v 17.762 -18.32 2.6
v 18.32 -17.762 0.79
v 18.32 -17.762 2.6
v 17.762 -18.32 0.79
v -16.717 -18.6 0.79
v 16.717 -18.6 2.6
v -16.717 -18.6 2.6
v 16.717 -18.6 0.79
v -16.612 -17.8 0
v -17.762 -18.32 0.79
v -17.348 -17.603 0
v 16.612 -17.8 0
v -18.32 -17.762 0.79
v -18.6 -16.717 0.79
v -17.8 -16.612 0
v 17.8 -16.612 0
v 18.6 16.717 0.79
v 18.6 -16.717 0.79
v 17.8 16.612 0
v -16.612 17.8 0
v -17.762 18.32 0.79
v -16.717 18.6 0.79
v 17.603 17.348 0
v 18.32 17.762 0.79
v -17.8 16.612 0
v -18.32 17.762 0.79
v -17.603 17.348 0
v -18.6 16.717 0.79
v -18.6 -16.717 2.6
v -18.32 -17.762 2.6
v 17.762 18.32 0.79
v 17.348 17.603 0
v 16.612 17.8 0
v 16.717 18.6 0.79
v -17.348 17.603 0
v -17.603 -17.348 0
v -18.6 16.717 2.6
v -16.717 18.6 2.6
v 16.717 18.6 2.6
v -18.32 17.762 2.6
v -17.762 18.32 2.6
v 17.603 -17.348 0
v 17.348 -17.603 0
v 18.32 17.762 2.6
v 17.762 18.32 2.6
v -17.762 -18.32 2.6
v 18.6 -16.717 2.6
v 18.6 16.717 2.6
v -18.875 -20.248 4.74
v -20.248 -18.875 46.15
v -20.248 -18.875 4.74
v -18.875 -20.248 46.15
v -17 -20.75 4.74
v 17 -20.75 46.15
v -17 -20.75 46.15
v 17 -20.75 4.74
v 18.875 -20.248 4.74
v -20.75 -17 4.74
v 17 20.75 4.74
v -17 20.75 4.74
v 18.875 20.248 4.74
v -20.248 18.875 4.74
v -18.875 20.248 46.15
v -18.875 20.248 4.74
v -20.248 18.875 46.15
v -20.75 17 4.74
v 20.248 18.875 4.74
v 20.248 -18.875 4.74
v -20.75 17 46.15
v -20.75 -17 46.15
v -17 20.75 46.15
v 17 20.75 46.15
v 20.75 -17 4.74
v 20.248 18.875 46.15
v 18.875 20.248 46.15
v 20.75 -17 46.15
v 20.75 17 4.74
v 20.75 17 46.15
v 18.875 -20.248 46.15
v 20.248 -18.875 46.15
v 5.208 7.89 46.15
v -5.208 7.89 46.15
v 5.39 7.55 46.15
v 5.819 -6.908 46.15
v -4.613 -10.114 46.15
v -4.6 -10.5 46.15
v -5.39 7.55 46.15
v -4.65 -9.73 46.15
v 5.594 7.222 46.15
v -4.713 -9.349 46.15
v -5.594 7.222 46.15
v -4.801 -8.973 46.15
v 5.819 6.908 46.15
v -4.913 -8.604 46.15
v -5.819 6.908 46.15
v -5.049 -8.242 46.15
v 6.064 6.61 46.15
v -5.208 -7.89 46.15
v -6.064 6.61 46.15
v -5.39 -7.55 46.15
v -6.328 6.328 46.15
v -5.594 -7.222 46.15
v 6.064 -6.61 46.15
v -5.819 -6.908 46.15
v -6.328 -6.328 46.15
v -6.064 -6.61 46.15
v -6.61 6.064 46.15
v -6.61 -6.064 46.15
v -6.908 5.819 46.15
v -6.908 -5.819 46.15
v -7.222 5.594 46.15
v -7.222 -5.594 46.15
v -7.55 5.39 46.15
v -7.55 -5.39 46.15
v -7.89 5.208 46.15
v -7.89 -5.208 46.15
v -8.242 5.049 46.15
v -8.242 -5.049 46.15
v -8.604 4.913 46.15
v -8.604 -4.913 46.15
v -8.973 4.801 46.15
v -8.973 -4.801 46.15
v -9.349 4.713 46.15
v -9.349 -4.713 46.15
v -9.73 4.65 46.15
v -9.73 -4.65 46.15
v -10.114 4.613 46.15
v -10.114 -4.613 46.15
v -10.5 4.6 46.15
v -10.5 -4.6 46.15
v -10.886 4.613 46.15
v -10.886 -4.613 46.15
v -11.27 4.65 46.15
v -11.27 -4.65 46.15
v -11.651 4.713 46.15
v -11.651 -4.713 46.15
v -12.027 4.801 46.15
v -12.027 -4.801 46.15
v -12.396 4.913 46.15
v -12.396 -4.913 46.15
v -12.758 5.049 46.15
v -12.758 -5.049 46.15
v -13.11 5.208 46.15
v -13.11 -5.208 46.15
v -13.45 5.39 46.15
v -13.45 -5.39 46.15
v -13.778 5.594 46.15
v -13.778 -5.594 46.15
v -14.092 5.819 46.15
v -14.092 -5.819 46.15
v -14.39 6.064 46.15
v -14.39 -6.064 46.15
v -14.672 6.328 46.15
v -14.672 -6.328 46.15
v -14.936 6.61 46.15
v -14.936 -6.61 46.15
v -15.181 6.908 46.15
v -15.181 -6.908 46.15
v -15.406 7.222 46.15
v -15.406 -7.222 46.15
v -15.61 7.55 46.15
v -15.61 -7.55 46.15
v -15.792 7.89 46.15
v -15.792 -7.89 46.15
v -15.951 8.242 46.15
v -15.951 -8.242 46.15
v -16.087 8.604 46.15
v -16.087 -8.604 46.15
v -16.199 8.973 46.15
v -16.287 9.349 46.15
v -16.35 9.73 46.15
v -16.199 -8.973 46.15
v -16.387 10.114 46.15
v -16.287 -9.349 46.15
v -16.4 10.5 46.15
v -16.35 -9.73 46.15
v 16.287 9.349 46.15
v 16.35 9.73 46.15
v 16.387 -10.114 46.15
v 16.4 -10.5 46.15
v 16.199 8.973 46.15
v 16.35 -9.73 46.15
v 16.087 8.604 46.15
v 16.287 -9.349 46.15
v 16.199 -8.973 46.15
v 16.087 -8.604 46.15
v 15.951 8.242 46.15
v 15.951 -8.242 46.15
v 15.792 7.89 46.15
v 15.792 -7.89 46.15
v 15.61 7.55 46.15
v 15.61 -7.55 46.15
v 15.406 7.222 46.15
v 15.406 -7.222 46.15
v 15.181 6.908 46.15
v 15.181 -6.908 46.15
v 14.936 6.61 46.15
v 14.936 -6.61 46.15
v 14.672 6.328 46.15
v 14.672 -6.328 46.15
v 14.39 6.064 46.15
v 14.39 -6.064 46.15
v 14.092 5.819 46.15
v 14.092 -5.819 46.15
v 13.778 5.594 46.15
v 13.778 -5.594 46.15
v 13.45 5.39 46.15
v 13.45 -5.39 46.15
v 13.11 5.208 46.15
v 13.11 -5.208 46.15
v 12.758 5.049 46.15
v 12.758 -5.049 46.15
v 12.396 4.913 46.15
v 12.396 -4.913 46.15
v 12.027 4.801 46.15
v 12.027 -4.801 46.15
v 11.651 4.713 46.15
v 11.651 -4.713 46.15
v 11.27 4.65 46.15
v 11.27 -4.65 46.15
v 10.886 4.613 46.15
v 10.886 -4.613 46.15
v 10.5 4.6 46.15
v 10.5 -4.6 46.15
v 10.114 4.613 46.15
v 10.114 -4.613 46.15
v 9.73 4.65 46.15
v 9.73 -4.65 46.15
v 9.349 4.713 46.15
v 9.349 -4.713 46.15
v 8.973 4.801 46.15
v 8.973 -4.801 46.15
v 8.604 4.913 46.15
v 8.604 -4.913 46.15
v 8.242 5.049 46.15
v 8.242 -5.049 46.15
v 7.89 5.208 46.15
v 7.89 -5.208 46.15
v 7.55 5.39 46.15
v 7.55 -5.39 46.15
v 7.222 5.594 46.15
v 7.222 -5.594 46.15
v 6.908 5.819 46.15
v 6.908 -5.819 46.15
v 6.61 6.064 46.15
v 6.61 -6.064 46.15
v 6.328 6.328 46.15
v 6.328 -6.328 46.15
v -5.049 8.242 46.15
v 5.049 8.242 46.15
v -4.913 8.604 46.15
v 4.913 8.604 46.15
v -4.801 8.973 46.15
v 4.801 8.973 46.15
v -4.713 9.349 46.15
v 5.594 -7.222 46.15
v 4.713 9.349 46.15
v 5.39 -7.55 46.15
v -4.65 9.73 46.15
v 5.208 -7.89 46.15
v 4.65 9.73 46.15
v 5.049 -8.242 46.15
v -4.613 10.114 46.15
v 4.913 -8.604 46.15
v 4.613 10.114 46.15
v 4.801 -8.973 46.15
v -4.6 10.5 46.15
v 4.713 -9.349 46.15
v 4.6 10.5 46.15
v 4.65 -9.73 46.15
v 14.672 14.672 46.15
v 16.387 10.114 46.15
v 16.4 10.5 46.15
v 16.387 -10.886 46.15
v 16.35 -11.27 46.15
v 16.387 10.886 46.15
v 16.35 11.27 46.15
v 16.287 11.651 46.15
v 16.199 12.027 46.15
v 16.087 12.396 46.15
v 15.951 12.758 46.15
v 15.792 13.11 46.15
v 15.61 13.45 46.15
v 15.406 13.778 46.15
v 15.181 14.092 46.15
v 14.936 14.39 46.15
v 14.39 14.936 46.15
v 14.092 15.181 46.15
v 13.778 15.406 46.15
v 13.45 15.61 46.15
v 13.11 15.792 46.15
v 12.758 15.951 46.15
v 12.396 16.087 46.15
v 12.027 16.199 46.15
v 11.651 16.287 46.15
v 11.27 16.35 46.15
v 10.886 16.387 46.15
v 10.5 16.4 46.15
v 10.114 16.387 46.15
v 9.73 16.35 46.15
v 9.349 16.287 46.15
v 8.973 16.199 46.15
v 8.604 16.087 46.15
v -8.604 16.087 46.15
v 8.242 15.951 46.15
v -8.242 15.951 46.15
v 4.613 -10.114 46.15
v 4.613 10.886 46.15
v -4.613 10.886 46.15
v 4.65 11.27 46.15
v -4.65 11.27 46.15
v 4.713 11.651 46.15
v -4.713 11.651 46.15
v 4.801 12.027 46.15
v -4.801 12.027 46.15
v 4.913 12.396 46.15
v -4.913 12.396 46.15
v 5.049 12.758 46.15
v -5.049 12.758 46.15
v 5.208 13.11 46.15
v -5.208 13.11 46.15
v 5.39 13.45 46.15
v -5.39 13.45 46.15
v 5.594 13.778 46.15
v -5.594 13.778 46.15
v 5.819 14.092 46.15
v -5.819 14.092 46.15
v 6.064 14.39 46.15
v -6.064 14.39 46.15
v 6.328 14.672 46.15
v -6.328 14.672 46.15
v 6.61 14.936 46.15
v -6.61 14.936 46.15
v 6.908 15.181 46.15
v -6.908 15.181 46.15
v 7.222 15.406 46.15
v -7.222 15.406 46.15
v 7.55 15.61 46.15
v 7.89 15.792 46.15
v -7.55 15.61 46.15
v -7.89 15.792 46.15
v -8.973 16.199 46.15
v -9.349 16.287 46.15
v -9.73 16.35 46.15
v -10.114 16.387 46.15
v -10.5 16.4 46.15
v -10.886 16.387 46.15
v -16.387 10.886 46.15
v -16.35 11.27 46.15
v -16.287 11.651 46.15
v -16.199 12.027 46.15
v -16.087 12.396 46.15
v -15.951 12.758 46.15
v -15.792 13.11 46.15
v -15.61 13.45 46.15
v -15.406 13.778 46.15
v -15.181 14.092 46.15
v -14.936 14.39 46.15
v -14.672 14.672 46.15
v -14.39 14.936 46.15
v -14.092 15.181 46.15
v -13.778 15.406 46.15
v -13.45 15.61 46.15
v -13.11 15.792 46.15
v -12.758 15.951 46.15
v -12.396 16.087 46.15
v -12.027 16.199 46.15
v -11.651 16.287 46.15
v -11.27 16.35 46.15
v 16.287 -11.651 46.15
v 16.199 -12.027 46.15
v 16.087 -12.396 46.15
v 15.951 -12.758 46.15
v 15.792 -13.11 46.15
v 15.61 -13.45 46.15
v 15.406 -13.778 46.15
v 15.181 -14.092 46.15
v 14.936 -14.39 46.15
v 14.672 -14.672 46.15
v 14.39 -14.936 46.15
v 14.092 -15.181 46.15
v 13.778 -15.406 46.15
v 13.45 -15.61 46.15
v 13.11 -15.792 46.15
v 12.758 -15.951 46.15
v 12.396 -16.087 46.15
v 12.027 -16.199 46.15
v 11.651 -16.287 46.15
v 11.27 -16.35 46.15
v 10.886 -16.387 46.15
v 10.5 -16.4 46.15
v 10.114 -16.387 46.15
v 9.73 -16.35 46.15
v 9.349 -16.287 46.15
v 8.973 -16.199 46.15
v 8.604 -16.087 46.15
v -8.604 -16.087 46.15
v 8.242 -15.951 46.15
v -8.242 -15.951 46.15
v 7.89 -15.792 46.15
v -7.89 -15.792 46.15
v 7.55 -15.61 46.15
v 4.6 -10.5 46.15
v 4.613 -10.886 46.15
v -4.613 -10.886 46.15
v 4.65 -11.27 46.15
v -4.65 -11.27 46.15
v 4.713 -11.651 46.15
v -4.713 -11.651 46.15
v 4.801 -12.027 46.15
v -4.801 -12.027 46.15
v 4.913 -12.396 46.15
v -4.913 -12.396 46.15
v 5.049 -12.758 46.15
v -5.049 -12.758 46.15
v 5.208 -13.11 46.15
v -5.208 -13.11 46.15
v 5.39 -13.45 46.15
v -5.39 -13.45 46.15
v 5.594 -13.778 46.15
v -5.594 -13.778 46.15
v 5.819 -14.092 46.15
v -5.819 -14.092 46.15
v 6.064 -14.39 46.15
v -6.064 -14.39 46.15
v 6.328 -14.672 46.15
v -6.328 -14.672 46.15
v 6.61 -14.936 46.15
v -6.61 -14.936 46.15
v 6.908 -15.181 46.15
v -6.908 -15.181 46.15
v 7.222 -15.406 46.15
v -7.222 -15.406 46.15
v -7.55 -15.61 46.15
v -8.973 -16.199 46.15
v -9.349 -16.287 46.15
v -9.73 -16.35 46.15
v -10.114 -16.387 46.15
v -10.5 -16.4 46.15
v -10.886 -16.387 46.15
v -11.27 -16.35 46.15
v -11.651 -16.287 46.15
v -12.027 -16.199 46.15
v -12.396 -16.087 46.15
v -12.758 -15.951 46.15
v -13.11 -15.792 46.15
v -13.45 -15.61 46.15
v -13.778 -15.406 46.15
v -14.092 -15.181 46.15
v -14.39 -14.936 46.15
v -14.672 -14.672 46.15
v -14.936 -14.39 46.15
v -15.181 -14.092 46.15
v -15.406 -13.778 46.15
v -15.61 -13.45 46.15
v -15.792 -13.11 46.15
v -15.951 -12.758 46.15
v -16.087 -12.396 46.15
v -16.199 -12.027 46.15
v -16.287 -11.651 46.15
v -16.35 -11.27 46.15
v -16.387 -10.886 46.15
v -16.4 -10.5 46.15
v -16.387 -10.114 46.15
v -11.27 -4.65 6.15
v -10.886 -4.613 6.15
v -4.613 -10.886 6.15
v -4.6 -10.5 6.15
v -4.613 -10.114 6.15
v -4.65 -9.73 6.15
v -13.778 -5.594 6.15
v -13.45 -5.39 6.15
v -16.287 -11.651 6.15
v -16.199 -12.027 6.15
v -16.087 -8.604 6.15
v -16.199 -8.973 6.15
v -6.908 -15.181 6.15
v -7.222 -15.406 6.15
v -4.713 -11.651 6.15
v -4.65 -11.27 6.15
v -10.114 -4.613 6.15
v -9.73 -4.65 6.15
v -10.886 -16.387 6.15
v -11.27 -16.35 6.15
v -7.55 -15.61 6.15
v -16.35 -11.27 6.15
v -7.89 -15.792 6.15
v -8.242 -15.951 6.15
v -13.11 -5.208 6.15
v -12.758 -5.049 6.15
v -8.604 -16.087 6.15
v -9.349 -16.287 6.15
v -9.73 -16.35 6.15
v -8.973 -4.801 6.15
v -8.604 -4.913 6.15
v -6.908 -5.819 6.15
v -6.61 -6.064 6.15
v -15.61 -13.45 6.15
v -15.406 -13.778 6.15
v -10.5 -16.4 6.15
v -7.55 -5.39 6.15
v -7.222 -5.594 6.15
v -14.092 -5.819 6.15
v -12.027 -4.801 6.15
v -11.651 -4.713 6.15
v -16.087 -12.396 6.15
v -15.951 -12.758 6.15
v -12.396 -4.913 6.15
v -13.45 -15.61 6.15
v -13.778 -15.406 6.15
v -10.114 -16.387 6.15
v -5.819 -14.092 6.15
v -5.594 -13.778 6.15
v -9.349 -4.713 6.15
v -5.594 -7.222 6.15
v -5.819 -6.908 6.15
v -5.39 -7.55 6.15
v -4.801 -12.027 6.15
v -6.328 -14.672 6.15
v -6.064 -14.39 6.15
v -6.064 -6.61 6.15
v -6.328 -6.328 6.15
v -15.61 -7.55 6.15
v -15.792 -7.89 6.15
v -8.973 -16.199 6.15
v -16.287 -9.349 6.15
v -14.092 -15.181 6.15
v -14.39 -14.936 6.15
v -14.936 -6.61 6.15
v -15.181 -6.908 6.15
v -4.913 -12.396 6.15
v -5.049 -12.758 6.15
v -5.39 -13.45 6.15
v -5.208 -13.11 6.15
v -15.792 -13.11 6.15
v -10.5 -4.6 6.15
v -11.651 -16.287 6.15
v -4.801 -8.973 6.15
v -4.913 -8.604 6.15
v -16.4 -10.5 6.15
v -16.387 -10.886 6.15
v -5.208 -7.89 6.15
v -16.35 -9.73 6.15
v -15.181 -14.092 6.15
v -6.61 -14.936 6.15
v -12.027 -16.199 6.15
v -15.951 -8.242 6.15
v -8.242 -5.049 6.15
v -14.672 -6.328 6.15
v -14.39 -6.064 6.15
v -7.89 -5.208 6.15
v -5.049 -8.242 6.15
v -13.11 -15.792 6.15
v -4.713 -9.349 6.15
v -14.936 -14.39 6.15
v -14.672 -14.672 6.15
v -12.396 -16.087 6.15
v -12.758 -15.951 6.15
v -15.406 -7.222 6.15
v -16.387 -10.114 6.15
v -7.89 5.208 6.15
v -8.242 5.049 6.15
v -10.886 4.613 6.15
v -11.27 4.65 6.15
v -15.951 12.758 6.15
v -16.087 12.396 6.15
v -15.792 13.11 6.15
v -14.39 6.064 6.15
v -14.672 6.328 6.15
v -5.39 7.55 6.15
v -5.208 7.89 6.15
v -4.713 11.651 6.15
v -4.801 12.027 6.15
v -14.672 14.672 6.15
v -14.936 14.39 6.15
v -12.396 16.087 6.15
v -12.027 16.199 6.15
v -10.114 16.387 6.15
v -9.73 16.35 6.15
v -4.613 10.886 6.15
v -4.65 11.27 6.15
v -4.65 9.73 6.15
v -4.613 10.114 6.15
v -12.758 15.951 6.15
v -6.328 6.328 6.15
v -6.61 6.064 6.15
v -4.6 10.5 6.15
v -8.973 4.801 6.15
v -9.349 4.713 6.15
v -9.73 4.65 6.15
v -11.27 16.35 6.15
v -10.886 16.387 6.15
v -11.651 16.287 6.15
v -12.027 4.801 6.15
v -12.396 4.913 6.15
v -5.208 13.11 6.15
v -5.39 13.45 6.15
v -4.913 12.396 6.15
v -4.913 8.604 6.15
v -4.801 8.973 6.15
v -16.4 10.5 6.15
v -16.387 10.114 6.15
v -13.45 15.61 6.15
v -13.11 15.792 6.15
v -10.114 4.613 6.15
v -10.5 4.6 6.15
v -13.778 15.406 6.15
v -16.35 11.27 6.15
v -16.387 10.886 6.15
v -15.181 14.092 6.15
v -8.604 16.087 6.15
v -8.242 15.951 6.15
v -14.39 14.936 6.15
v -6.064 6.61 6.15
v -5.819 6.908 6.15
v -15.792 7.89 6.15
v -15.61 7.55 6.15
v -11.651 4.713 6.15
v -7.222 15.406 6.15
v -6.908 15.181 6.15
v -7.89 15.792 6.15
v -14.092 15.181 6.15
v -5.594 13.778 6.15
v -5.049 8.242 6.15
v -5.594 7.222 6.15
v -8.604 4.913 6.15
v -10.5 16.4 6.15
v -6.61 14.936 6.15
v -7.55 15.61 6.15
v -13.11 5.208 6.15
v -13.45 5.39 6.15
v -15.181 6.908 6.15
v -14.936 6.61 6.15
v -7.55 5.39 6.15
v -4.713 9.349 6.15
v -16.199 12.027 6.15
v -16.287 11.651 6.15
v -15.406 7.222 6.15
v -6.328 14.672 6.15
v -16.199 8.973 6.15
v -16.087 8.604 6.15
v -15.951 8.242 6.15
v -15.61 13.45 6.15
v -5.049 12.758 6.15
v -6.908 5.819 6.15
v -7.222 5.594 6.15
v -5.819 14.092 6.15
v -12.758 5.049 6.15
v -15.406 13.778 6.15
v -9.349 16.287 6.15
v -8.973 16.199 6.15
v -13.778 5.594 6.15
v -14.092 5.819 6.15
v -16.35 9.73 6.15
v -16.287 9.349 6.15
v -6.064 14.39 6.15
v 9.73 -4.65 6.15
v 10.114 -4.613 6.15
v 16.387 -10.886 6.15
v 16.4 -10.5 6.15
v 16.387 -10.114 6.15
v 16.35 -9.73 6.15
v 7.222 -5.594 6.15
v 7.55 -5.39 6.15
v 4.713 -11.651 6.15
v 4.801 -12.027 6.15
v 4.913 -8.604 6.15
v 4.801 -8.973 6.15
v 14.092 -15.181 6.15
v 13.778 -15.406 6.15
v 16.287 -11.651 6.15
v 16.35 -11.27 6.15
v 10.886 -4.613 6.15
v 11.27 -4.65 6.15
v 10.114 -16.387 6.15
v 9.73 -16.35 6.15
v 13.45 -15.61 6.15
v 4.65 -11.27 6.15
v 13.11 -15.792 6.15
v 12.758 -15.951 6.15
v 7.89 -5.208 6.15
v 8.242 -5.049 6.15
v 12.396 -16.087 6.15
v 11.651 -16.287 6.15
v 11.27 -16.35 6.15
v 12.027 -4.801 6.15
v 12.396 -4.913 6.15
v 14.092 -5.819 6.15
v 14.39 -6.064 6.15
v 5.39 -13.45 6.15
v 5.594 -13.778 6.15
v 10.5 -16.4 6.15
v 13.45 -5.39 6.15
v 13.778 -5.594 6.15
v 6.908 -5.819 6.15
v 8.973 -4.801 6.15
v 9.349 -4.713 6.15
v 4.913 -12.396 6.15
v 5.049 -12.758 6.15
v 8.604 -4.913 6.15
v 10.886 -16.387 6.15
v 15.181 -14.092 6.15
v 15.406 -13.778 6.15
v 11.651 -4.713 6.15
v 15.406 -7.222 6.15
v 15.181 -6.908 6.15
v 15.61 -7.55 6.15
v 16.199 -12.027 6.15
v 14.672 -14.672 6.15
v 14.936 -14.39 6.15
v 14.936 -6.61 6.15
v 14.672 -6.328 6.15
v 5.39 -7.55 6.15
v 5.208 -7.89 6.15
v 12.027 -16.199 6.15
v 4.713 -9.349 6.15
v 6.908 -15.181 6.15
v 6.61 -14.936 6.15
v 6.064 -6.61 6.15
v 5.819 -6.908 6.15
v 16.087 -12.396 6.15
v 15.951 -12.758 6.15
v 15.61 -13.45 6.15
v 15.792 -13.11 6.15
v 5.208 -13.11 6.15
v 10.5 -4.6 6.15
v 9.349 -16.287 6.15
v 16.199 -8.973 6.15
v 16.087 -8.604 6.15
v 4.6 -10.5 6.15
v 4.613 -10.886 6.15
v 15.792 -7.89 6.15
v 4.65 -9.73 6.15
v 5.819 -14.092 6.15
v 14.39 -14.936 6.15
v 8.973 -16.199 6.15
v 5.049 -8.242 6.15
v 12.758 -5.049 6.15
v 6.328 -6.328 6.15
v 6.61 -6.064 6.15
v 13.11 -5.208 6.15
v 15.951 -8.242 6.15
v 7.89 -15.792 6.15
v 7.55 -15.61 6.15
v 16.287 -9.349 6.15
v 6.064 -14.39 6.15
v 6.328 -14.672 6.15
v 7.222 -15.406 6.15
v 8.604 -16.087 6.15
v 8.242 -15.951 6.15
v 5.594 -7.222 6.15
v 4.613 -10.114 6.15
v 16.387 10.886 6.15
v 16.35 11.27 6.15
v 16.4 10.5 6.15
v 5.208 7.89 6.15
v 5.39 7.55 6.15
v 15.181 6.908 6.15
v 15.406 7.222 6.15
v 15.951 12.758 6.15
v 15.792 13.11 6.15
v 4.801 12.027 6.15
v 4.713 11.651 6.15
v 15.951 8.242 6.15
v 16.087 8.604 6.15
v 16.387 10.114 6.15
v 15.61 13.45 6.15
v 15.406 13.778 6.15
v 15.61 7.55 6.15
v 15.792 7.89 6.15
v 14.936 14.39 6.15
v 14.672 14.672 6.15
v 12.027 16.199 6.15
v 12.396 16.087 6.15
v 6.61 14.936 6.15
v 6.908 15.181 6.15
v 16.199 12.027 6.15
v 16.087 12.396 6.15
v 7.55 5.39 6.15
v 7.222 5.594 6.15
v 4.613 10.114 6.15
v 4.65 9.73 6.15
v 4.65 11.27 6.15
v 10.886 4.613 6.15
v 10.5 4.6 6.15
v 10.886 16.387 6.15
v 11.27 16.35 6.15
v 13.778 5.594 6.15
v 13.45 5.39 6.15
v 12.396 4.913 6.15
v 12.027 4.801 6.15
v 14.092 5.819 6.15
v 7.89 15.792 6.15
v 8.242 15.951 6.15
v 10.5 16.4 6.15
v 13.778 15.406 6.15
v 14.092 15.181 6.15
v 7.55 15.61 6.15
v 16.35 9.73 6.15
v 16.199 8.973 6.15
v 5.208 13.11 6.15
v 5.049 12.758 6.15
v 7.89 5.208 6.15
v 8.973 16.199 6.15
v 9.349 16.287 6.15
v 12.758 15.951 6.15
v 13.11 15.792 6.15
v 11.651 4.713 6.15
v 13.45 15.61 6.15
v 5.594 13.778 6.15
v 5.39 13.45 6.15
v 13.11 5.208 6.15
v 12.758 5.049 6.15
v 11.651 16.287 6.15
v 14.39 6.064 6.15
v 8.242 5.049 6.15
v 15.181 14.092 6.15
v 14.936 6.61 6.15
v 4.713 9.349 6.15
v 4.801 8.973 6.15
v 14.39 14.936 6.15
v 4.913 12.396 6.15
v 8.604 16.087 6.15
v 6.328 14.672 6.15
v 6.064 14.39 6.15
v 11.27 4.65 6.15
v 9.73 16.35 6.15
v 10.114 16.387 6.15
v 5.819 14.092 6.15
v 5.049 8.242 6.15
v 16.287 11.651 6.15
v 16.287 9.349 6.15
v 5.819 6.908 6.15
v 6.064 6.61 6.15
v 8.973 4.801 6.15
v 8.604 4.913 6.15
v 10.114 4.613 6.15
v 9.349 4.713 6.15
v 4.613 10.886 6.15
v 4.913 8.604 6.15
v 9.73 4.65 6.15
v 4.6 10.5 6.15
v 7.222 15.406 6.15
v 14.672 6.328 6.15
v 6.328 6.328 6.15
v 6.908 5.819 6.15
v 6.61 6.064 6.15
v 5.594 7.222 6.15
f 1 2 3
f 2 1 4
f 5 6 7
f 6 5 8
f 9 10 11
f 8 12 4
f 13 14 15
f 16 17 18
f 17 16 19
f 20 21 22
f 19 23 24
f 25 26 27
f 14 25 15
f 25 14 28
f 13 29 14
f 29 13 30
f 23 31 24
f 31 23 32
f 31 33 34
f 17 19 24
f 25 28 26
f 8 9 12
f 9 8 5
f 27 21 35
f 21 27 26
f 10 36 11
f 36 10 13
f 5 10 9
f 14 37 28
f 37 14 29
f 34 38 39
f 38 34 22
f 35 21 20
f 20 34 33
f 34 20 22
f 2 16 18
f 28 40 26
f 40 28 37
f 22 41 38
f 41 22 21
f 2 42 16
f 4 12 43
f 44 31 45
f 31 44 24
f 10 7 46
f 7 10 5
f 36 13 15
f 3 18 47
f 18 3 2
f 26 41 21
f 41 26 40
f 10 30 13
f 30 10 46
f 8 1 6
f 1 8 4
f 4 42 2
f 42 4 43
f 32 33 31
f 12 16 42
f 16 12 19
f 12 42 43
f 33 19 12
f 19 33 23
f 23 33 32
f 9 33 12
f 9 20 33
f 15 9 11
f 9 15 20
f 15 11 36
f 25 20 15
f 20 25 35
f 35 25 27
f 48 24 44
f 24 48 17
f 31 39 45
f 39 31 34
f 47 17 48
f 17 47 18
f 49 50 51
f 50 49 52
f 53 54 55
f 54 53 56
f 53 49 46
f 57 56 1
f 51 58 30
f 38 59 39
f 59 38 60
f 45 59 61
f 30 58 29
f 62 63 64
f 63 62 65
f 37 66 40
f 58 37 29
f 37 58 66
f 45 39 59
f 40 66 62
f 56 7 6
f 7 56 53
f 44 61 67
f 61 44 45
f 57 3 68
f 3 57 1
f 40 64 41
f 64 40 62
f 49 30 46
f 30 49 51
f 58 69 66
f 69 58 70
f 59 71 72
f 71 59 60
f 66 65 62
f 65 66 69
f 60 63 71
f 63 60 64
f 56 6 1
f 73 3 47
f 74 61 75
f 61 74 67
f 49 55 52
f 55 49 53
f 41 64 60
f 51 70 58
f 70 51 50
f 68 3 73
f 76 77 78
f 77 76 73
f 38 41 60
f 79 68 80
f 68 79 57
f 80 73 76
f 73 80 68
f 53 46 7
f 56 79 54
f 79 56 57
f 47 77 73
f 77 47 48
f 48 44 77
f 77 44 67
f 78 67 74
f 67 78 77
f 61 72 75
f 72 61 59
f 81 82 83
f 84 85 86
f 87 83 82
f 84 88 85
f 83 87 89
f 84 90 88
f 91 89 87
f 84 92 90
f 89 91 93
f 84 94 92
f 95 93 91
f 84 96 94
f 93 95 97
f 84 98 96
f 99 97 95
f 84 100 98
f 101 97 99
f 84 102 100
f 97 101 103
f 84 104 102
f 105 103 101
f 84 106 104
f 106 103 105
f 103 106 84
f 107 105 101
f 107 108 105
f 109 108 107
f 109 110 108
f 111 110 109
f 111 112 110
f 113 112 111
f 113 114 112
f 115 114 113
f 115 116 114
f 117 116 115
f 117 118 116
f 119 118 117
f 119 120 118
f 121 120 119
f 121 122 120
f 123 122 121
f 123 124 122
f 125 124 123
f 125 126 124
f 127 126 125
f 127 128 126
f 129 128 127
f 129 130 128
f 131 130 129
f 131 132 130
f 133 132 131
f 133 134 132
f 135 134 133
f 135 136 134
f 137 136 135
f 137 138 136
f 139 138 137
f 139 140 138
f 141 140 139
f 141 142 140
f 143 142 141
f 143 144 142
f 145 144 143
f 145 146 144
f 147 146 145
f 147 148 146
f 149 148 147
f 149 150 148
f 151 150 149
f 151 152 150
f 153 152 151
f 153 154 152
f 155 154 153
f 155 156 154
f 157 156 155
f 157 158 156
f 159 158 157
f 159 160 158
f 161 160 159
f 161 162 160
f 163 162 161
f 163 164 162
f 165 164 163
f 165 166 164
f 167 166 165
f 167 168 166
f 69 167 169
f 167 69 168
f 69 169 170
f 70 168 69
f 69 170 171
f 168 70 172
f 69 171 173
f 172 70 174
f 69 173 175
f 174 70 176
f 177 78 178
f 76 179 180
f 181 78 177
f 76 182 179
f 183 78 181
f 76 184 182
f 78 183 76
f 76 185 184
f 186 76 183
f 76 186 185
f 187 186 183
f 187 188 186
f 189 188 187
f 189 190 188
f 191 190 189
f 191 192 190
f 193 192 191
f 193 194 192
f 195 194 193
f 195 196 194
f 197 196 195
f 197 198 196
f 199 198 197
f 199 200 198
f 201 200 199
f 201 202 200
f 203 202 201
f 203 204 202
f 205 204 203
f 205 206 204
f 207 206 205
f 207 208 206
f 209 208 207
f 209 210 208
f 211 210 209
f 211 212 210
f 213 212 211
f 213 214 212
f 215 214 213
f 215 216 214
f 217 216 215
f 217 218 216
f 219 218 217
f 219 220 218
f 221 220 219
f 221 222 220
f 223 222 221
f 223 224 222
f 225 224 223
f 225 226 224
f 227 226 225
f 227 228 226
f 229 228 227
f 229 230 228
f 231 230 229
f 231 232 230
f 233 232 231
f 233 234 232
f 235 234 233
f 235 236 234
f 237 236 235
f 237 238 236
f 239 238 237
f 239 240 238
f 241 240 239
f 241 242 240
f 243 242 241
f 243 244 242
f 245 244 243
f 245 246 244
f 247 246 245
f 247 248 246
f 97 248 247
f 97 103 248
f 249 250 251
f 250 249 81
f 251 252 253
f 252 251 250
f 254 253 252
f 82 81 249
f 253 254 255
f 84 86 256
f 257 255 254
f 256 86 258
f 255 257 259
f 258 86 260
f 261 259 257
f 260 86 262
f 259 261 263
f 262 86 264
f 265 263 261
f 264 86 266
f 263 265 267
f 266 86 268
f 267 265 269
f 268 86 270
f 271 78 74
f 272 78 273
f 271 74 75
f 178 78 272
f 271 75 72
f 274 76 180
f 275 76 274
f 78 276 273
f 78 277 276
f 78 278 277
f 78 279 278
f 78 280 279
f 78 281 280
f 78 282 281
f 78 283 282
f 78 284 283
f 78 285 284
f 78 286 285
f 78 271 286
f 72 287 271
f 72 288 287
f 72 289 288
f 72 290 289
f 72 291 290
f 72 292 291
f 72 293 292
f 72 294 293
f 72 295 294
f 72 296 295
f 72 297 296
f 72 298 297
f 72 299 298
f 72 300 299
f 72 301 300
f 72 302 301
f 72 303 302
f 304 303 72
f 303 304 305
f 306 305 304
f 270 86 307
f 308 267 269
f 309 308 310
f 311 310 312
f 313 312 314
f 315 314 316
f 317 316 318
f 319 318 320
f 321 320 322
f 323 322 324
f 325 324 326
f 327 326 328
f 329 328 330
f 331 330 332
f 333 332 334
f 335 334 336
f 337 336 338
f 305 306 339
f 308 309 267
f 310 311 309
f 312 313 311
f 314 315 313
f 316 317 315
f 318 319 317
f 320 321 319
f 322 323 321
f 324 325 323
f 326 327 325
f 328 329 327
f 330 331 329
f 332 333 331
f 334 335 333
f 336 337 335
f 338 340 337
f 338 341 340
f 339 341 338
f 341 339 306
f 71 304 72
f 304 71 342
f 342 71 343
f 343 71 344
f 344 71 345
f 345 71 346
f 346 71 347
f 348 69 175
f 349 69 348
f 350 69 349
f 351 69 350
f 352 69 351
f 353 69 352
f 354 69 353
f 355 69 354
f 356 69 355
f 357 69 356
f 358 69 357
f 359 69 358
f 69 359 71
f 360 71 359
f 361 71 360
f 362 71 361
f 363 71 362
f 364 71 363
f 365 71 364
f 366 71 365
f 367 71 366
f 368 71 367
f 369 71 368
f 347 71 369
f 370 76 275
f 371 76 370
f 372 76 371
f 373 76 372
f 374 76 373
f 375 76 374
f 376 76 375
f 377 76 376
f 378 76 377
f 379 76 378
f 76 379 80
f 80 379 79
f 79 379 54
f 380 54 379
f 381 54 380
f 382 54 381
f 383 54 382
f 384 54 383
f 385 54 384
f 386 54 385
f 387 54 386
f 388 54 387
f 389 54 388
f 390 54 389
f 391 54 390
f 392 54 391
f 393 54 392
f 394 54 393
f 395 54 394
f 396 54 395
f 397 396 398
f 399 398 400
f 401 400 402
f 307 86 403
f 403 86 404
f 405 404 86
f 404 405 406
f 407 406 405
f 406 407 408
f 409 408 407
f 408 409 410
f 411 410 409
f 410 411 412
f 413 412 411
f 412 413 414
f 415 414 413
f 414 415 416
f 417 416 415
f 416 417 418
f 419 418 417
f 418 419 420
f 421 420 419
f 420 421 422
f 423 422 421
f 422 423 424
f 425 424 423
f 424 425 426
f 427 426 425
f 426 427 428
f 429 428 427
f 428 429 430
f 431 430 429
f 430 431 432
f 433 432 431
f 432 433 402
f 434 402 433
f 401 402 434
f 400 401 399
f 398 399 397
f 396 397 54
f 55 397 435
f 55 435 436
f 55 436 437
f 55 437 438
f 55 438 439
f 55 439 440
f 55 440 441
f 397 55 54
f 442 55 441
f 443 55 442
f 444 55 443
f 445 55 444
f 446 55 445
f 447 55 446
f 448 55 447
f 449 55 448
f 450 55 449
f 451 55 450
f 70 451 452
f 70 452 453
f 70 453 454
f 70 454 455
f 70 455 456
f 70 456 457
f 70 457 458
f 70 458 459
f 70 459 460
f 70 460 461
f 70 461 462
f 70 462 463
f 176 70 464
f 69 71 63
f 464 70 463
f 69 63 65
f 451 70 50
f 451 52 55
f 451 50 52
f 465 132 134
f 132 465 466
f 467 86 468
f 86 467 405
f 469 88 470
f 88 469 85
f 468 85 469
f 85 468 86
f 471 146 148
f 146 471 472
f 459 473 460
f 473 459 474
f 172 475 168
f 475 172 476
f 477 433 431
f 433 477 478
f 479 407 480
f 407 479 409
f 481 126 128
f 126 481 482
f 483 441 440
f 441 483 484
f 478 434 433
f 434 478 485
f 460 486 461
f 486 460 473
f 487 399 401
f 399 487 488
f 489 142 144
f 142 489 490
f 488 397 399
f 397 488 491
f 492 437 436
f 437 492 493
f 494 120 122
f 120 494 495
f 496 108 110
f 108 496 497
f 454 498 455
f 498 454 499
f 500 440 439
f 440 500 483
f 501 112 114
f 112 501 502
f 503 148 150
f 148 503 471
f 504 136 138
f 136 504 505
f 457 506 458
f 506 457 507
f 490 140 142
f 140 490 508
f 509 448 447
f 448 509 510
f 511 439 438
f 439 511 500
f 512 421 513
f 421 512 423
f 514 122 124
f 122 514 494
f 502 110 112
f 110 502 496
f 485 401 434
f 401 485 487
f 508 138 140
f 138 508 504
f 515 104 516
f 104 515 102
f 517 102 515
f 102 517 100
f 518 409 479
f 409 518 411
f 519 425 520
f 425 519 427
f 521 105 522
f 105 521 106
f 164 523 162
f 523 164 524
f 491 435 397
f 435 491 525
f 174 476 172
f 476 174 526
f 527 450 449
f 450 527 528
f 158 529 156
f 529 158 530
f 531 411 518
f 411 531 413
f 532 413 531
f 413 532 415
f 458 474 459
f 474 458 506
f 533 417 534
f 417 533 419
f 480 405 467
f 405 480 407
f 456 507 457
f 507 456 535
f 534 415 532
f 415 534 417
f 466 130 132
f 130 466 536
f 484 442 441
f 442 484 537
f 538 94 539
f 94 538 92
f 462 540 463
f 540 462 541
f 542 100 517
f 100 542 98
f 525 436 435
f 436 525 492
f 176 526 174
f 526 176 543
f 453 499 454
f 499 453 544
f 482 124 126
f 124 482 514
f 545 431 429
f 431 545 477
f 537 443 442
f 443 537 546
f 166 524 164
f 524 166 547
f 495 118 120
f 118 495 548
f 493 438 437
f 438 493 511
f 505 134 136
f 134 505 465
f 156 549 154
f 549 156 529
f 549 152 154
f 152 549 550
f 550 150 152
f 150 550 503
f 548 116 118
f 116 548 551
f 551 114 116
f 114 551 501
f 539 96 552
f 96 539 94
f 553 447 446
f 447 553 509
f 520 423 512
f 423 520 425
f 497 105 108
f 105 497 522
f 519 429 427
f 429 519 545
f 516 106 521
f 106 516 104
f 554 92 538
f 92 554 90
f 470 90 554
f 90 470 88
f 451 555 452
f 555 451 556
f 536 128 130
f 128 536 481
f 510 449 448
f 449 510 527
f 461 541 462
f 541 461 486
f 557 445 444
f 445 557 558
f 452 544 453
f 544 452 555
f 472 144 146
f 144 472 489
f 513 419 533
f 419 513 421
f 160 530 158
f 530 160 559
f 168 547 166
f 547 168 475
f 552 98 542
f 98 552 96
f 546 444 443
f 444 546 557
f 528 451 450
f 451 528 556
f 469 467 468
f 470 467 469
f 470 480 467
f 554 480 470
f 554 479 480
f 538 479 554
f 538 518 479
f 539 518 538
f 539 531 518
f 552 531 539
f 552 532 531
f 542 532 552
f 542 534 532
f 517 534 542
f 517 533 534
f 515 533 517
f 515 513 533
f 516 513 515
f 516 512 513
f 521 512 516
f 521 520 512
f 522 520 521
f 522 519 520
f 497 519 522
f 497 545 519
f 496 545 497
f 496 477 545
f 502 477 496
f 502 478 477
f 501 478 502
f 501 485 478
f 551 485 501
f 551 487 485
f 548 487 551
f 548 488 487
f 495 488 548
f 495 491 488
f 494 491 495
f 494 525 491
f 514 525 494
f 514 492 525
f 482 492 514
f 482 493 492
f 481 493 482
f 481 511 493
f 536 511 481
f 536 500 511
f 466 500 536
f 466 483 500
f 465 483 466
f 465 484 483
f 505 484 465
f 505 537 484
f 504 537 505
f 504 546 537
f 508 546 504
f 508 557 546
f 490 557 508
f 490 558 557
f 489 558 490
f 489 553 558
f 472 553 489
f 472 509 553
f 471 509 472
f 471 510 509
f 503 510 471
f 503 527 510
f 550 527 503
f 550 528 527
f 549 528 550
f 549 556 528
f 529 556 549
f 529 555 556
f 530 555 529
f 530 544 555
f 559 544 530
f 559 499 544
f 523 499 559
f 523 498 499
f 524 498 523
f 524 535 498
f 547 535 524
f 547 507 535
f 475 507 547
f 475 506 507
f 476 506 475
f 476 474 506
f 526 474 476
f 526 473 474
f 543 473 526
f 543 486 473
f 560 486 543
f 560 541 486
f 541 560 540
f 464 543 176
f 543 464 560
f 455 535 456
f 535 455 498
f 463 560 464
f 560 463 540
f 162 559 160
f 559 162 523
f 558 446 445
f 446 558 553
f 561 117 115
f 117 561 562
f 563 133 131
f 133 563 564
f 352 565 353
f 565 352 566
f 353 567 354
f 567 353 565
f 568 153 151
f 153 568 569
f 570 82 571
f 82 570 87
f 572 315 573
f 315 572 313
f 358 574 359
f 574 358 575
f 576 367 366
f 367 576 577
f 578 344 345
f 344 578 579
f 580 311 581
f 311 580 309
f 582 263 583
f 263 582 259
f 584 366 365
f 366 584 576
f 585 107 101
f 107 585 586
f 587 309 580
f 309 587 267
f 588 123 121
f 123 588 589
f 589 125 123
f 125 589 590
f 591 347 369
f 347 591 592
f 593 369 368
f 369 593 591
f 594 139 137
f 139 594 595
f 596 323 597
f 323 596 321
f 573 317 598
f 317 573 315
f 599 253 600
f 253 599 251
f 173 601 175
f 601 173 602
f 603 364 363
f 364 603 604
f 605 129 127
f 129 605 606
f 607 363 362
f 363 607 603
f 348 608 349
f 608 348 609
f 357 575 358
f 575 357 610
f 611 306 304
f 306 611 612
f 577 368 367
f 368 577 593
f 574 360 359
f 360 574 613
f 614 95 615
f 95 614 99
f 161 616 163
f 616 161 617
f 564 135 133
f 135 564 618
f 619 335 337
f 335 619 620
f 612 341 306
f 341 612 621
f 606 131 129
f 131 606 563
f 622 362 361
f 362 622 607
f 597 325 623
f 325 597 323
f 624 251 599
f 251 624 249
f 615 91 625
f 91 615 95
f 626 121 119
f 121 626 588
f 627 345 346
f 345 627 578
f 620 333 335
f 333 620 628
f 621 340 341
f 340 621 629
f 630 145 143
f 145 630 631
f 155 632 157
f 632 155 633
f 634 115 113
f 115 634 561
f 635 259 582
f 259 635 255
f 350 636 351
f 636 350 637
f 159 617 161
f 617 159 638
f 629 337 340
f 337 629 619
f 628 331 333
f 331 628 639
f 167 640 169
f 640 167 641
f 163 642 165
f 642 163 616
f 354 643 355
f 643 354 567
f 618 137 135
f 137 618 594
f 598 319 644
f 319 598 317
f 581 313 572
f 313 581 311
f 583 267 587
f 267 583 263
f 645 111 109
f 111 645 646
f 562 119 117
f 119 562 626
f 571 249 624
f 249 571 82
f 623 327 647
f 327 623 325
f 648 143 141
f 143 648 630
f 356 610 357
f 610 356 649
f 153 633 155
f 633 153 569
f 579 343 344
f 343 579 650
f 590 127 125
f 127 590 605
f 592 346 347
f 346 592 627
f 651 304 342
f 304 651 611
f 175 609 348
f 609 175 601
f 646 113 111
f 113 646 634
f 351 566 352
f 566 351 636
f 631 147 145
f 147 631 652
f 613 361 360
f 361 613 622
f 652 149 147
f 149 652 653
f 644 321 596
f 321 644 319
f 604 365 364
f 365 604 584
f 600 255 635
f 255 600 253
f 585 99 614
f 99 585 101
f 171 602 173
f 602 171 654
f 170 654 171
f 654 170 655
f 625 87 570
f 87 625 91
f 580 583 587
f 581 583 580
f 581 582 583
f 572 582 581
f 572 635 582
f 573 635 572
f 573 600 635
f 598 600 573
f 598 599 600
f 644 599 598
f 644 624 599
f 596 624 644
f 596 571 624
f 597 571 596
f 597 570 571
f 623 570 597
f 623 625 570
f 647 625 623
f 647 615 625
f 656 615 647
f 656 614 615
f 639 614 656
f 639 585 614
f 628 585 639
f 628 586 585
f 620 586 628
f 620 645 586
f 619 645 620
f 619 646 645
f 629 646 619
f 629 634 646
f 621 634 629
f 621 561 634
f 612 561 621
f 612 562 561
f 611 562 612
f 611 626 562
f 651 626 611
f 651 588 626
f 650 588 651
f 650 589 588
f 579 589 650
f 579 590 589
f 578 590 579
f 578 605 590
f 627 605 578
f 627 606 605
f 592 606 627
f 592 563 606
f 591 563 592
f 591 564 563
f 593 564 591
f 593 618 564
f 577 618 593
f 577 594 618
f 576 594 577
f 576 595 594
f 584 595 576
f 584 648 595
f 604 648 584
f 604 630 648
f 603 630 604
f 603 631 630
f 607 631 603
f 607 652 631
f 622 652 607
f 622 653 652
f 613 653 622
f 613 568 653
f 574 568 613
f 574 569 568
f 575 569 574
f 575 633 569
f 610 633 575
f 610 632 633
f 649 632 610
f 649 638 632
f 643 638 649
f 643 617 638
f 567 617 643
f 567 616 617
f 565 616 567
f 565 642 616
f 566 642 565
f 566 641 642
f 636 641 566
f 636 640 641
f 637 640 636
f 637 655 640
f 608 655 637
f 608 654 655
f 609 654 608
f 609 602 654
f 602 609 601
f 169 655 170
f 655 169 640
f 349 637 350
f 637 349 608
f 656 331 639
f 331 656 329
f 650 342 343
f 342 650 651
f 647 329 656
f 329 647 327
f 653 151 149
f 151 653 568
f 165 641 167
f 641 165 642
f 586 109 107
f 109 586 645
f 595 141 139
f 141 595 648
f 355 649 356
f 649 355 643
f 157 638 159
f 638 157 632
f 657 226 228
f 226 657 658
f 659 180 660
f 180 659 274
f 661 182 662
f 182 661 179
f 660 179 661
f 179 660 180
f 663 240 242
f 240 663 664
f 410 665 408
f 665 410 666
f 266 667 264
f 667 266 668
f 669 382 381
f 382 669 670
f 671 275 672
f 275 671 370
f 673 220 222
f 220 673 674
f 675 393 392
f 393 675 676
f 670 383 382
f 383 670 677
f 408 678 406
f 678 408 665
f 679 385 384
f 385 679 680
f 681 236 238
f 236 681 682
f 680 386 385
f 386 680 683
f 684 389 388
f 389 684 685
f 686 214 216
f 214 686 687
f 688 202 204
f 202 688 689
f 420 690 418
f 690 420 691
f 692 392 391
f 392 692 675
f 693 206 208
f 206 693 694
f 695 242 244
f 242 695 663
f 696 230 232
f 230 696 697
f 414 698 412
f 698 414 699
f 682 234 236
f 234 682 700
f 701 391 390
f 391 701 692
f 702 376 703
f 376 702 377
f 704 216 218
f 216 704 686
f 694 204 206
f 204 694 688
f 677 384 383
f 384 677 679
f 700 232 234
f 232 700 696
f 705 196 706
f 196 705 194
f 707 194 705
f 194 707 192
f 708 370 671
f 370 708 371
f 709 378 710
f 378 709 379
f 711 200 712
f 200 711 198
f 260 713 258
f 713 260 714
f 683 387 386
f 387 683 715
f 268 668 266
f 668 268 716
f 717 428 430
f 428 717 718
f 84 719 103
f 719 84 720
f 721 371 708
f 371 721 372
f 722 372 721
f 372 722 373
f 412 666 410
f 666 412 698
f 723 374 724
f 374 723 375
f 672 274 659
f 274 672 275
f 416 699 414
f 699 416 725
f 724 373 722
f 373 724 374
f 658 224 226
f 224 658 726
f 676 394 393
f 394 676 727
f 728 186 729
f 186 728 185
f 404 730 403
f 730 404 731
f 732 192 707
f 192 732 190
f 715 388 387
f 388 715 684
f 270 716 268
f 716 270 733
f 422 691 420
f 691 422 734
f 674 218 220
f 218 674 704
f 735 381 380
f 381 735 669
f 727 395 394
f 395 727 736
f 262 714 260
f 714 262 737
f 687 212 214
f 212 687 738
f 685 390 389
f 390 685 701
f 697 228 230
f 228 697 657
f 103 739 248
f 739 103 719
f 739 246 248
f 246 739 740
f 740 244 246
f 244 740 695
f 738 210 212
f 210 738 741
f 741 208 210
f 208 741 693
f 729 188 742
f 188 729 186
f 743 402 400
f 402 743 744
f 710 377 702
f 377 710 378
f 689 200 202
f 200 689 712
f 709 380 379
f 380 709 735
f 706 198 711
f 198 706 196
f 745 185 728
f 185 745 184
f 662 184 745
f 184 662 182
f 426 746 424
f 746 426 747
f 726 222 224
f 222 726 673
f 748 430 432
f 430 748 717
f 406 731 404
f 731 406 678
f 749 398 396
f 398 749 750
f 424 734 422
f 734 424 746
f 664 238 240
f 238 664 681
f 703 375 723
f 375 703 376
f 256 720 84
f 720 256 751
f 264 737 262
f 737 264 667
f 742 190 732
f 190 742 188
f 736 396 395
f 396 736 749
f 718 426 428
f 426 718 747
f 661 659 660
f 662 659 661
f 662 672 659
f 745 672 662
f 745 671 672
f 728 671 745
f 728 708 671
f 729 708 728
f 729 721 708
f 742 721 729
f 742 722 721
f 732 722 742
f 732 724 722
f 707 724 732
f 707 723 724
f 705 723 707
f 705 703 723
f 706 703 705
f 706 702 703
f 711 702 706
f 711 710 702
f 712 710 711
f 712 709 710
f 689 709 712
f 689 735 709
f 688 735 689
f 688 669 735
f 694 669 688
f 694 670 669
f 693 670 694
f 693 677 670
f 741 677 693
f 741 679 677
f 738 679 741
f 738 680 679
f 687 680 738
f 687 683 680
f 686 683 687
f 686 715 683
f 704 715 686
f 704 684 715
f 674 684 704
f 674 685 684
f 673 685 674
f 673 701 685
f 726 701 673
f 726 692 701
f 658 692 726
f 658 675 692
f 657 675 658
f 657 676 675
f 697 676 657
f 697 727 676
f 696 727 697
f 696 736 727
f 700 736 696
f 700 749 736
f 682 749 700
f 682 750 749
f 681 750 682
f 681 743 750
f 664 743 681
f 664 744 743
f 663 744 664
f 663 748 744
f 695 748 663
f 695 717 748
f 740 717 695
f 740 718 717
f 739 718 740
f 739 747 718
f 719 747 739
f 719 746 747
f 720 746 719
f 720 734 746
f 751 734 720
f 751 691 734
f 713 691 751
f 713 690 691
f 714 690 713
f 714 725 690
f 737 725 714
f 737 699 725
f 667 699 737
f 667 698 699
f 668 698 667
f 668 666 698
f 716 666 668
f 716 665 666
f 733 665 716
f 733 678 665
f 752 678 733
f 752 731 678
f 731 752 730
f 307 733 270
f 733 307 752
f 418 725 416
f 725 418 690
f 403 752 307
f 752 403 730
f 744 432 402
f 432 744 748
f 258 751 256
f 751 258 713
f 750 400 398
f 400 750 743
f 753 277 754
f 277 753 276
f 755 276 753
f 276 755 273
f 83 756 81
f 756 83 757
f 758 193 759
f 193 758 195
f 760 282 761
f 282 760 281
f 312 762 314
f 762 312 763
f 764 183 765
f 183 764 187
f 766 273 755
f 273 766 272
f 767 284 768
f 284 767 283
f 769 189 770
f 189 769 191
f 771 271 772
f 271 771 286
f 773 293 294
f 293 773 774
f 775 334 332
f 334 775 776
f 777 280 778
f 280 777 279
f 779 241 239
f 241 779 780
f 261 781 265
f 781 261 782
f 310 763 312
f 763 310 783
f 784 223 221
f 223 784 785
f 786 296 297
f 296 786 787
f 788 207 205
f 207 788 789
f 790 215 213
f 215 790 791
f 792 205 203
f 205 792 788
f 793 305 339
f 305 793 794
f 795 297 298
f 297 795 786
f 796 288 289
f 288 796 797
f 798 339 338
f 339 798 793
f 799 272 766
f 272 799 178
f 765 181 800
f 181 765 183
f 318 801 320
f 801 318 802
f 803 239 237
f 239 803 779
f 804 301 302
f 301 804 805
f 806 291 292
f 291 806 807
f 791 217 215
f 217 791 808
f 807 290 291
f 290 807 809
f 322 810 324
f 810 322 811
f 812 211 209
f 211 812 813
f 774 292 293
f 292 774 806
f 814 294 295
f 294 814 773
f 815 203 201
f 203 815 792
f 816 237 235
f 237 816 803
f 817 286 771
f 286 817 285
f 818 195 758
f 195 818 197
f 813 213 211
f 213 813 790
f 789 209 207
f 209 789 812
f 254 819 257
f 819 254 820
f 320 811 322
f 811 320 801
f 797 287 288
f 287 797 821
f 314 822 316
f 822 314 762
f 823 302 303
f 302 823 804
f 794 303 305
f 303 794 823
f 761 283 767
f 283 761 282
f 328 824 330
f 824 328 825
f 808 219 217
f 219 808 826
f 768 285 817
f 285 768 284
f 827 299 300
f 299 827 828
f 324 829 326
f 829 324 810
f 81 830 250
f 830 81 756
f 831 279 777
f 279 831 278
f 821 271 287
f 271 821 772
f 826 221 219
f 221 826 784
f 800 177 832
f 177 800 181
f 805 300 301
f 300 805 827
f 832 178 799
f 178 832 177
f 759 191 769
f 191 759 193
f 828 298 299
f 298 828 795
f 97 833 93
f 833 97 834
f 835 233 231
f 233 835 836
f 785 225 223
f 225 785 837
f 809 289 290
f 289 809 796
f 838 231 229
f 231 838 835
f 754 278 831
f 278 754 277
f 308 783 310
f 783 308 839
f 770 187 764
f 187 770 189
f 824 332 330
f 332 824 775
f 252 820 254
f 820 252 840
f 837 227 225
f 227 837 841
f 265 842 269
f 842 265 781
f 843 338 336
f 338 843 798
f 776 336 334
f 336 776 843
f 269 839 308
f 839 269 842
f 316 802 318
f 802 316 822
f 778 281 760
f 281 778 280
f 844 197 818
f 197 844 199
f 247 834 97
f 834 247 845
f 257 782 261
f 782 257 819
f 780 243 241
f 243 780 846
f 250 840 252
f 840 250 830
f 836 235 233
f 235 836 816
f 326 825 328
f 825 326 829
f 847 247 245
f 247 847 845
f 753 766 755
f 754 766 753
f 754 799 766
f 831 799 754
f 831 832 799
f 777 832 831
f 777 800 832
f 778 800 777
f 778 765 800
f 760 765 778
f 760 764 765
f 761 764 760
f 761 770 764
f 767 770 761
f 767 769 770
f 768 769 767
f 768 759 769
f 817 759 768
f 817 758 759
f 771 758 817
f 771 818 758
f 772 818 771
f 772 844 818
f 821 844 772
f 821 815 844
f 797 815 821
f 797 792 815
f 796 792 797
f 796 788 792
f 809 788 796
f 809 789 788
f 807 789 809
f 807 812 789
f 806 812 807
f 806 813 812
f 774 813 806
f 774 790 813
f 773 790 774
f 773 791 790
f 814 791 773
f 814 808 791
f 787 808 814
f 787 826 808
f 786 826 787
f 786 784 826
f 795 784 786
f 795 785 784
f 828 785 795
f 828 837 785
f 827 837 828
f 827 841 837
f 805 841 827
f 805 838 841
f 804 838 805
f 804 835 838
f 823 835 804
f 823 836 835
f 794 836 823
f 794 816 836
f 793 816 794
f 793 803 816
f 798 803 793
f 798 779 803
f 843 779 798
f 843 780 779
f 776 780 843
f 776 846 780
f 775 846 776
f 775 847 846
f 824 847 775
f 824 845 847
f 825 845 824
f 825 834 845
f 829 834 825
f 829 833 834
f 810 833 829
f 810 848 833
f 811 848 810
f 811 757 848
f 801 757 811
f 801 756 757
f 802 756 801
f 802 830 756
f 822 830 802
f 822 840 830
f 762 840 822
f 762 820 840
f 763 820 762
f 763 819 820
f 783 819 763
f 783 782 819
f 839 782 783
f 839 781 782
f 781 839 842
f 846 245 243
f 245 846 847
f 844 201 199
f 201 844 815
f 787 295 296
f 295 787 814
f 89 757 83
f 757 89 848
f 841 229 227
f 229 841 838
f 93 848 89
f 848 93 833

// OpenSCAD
// file: ../lib/gridfinity.scad
// gridfinity.scad — shared Gridfinity baseplate + bin library (per spec).
//
// 42 mm pitch, 41.5 mm bins, baseplate socket 0.7/1.8/2.15 = 4.65 mm, 4 mm
// fillet; bin foot 0.8/1.8/2.15 = 4.75 mm, 3.75 mm corner radius. Verified the
// bin foot seats in the baseplate socket with ~0.25–0.5 mm clearance.
//
//   baseplate(nx, ny)                      — tiled receiving baseplate
//   bin_blank(nx, ny, h)                   — solid bin body (feet + block, no cavity)
//   bin(nx, ny, h, wall, floor)            — open Gridfinity bin
//   divided_bin(nx, ny, h, cols, rows, …)  — bin with internal compartments
//   lid(nx, ny, …)                         — friction lid for a bin of the same footprint
//   stack_base(nx, ny, h, …)               — baseplate-topped base; a bin socket-stacks on it

GF = 42; GF_FILLET = 4;
_C_TOP = 2.15; _C_MID = 1.8; _C_BOT = 0.7;
_BP_LIP = _C_TOP + _C_MID + _C_BOT; _BP_FLOOR = 1.2; BP_H = _BP_LIP + _BP_FLOOR;  // 5.85
BIN_SZ = 41.5; BIN_R = 3.75; BIN_BASE_H = 4.75;

// ---- baseplate ----
module _bp_cell(i = 0) { offset(r = -i) offset(r = GF_FILLET) offset(r = -GF_FILLET) square(GF, center = true); }
module _bp_socket() {
    e = 0.01;
    hull() { translate([0,0,BP_H-e]) linear_extrude(e) _bp_cell(0); translate([0,0,BP_H-_C_TOP]) linear_extrude(e) _bp_cell(_C_TOP); }
    translate([0,0,BP_H-_C_TOP-_C_MID]) linear_extrude(_C_MID) _bp_cell(_C_TOP);
    hull() { translate([0,0,BP_H-_C_TOP-_C_MID-e]) linear_extrude(e) _bp_cell(_C_TOP); translate([0,0,BP_H-_BP_LIP]) linear_extrude(e) _bp_cell(_C_TOP+_C_BOT); }
}
module baseplate(nx, ny) {
    w = nx*GF; d = ny*GF;
    difference() {
        translate([0,0,BP_H/2]) linear_extrude(BP_H, center=true) offset(GF_FILLET) offset(-GF_FILLET) square([w,d], center=true);
        for (ix=[0:nx-1], iy=[0:ny-1]) translate([(ix-(nx-1)/2)*GF, (iy-(ny-1)/2)*GF, 0]) _bp_socket();
    }
}

// ---- bin ----
module _bin_cell(i = 0) { offset(r = -i) offset(r = BIN_R) offset(r = -BIN_R) square(BIN_SZ, center = true); }
module _bin_foot() {
    e = 0.01;
    hull() { linear_extrude(e) _bin_cell(2.95); translate([0,0,0.8]) linear_extrude(e) _bin_cell(2.15); }    // bottom chamfer
    translate([0,0,0.8]) linear_extrude(1.8) _bin_cell(2.15);                                                 // vertical
    hull() { translate([0,0,2.6]) linear_extrude(e) _bin_cell(2.15); translate([0,0,BIN_BASE_H]) linear_extrude(e) _bin_cell(0); } // top chamfer
}
// Solid bin body: Gridfinity feet + the block above them, with no cavity cut.
// Cup-style bins (lib/vessel.scad) subtract their own bores from this instead of
// re-deriving the foot + shell union.
module bin_blank(nx, ny, h) {
    W = nx*GF - 0.5; D = ny*GF - 0.5;
    union() {
        for (ix=[0:nx-1], iy=[0:ny-1]) translate([(ix-(nx-1)/2)*GF, (iy-(ny-1)/2)*GF, 0]) _bin_foot();
        translate([0,0,BIN_BASE_H]) linear_extrude(h-BIN_BASE_H) offset(BIN_R) offset(-BIN_R) square([W,D], center=true);
    }
}

module _bin_shell(nx, ny, h, wall, floor) {
    W = nx*GF - 0.5; D = ny*GF - 0.5;
    difference() {
        bin_blank(nx, ny, h);
        translate([0,0,BIN_BASE_H+floor]) linear_extrude(h) offset(BIN_R-wall) offset(-(BIN_R-wall)) square([W-2*wall, D-2*wall], center=true);
    }
}
module bin(nx, ny, h, wall = 1.2, floor = 1.4) { _bin_shell(nx, ny, h, wall, floor); }

// ---- stacking base ----
// A bin whose TOP is a Gridfinity baseplate, so a standard bin socket-stacks on
// it (two-tier towers: instrument on top, cords/jig/adapters in the base). The
// base is open at the FRONT (−Y) by default so the lower item is reachable while
// the top tier stays socketed — same idea as drybox-splitter-stand's open cubby.
// The whole tower foots on the bench baseplate via this base's own foot.
//
//   h = interior height of the lower compartment (floor to the baseplate cap).
module stack_base(nx, ny, h, wall = 1.2, floor = 1.4, open_front = true) {
    W = nx*GF - 0.5; D = ny*GF - 0.5;
    z0 = BIN_BASE_H + floor;
    iw = W - 2*wall; id = D - 2*wall;
    difference() {
        union() {
            bin_blank(nx, ny, h);                    // solid foot + block to h
            translate([0,0,h]) baseplate(nx, ny);    // baseplate cap (sockets up)
        }
        // lower cavity, floor up to the cap underside
        translate([0,0,z0]) linear_extrude(h - z0 + 0.01)
            offset(BIN_R-wall) offset(-(BIN_R-wall)) square([iw, id], center=true);
        // open front: cut the −Y wall so you reach in under the cap
        if (open_front)
            translate([-iw/2, -D, z0]) cube([iw, D/2 + 0.01, h - z0 + 0.01]);
    }
}

module divided_bin(nx, ny, h, cols = 1, rows = 1, wall = 1.2, floor = 1.4, div = 1.2) {
    W = nx*GF - 0.5; D = ny*GF - 0.5;
    union() {
        bin(nx, ny, h, wall, floor);
        // internal divider walls (from the floor up to the rim)
        iw = W - 2*wall; id = D - 2*wall; z0 = BIN_BASE_H + floor;
        for (c = [1 : cols-1]) translate([-iw/2 + c*iw/cols - div/2, -id/2, z0]) cube([div, id, h - z0]);
        for (r = [1 : rows-1]) translate([-iw/2, -id/2 + r*id/rows - div/2, z0]) cube([iw, div, h - z0]);
    }
}

// ---- lid ----
// Friction lid for a bin of the same footprint: a flat plate with a skirt that
// drops into the bin's cavity. Emitted PRINT-READY — plate on the bed, skirt
// standing up — so it needs no supports. Flip it in your head to picture it
// fitted: the plate then caps the rim and the lid adds `t` to the stack height.
//
// Why lids exist here: full-extension drawer slides let small parts hop between
// compartments on a hard close, and brass inserts aren't magnetic — you can't
// sweep them back. `wall` must match the bin's wall so the skirt lands in the
// cavity; `clearance` is per-side slop between skirt and cavity.
module lid(nx, ny, t = 1.6, skirt = 4, wall = 1.2, clearance = 0.35, lid_wall = 1.6) {
    W = nx*GF - 0.5; D = ny*GF - 0.5;
    iw = W - 2*wall - 2*clearance; id = D - 2*wall - 2*clearance;   // skirt outer
    ir = BIN_R - wall;                                              // cavity corner radius
    union() {
        linear_extrude(t) offset(BIN_R) offset(-BIN_R) square([W, D], center=true);
        translate([0,0,t]) linear_extrude(skirt) difference() {
            offset(ir) offset(-ir) square([iw, id], center=true);
            offset(ir-lid_wall) offset(-(ir-lid_wall)) square([iw-2*lid_wall, id-2*lid_wall], center=true);
        }
    }
}
// file: ../lib/vessel.scad
// vessel.scad — parametric collar cups for bottles, cans, and pen-form tools.
//
// A collar cup is a solid Gridfinity block with cylindrical bores sunk into it.
// It LOCATES a vessel; it does not clamp one. That distinction is the whole
// design: a collar that grips harder than the bin weighs comes out of the
// baseplate with the bottle when you grab it one-handed. Clearance, not
// interference — CLR is per-diameter, not per-side.
//
// Capture depth is roughly a third of the vessel's height. Enough to resist a
// knock (this bench sits under a 180 W fume-extractor intake), not so much that
// you're fishing the bottle out.
//
//   collar_cup(nx, ny, vessel_d, capture_h, …)   — one centred bore
//   collar_cup_multi(nx, ny, bores, capture_h, …) — bores = [[x, y, d], …]
//
// Cord slot: pen-form tools that stand in a cup are usually corded (the HARDELL
// rotary tool takes a barrel jack). Without a slot the lead drapes over the rim
// and levers the tool sideways. `cord_w > 0` cuts a channel from the bore out
// through the wall, open to the top.

include <gridfinity.scad>

CLR      = 1.0;   // bore = vessel_d + CLR. Loose on purpose — see above.
MIN_WALL = 1.2;   // minimum material between two bores, and bore to outer face

// ---- geometry guards ----
// Overlapping bores and bores that break out through the side wall both still
// render as perfectly watertight, 2-manifold meshes — CI cannot tell you the
// part is wrong, only that it is closed. These asserts encode the intent that
// the mesh check can't. Cheap, and they fire at render time rather than on the
// printer.
function _pair_gaps(bores, clr) = [
    for (i = [0 : len(bores)-1], j = [0 : len(bores)-1]) if (i < j)
        norm([bores[i][0]-bores[j][0], bores[i][1]-bores[j][1]])
        - (bores[i][2]+clr)/2 - (bores[j][2]+clr)/2
];
function _edge_gaps(bores, clr, W, D) = [
    for (b = bores) min(W/2 - abs(b[0]) - (b[2]+clr)/2,
                        D/2 - abs(b[1]) - (b[2]+clr)/2)
];

// Multi-bore block. Bores are [x, y, diameter] in mm, relative to the block centre.
module collar_cup_multi(nx, ny, bores, capture_h, floor = 1.4, clr = CLR,
                        cord_w = 0, cord_at = 0, min_wall = MIN_WALL) {
    h = BIN_BASE_H + floor + capture_h;
    e = 0.1;
    W = nx*GF - 0.5; D = ny*GF - 0.5;
    _pg = _pair_gaps(bores, clr);
    _eg = _edge_gaps(bores, clr, W, D);
    assert(len(_pg) == 0 || min(_pg) >= min_wall,
           "collar_cup: bores are too close — they would merge into one pocket");
    assert(min(_eg) >= min_wall,
           "collar_cup: a bore breaches the outer wall — block needs more units");
    difference() {
        bin_blank(nx, ny, h);
        for (b = bores)
            translate([b[0], b[1], BIN_BASE_H + floor])
                cylinder(d = b[2] + clr, h = capture_h + e, $fn = 96);
        // Cord channel: from the first bore outward through the +X wall, open to
        // the rim so the lead drops in from above rather than threading.
        if (cord_w > 0)
            translate([bores[0][0], bores[0][1] - cord_w/2, BIN_BASE_H + floor + cord_at])
                cube([nx*GF, cord_w, h]);
    }
}

// Single centred bore — the common case.
module collar_cup(nx, ny, vessel_d, capture_h, floor = 1.4, clr = CLR,
                  cord_w = 0, cord_at = 0, min_wall = MIN_WALL) {
    collar_cup_multi(nx, ny, [[0, 0, vessel_d]], capture_h, floor, clr,
                     cord_w, cord_at, min_wall);
}

// Evenly spaced row of same-depth bores along X — for a rank of aerosol cans.
// Returns geometry, not a list; pass the diameters and it lays them out on the
// block's centre line.
module collar_cup_row(nx, ny, diameters, capture_h, floor = 1.4, clr = CLR,
                      min_wall = MIN_WALL) {
    n = len(diameters);
    pitch = nx * GF / n;
    collar_cup_multi(nx, ny,
        [for (i = [0 : n-1]) [(i - (n-1)/2) * pitch, 0, diameters[i]]],
        capture_h, floor, clr, 0, 0, min_wall);
}
// file: ../lib/syringe.scad
// syringe.scad — bore-grid racks: a Gridfinity block drilled with a 2D array of
// vertical holes. Syringes, barrel tips, rotary burrs — same form, different
// numbers.
//
// This is a layout helper over collar_cup_multi(), not new geometry. The bores
// are VERTICAL: no overhangs to print, densest packing, shortest block. Tilting
// them toward the user reads better and plucks easier, but costs all three —
// revisit only if upright proves annoying in practice.
//
// Bore depth is a CAPTURE depth, not the item's length. A 125 mm syringe in a
// 35 mm bore stands like a pen in a cup; the block doesn't grow to swallow it.
//
//   bore_grid(cols, rows, d, px, py)          — position list, for composing
//   syringe_rack(nx, ny, cols, rows, d, …)    — the finished rack
//
// Auto-pitch: with pitch = nx*GF/cols and the grid centred, the margin from the
// outermost bore's centre to the block edge is exactly pitch/2 — so a single
// condition, pitch >= bore + 2*min_wall, guards BOTH inter-bore webs and the
// outer wall. That's what the assert below checks. It is not decoration: a
// plausible-looking spec (10 mm syringes, 6 across a 2-unit block) leaves a
// 0.84 mm outer wall, which you would otherwise find out about on the printer.

include <vessel.scad>

SYR_CLR      = 1.0;   // bore = syringe_d + SYR_CLR (per diameter, not per side)
SYR_MIN_WALL = 1.2;   // minimum web between bores, and bore to outer face

// Bore centres for a cols × rows grid, centred on the origin.
function bore_grid(cols, rows, d, px, py) =
    [for (c = [0 : cols-1], r = [0 : rows-1])
        [(c - (cols-1)/2) * px, (r - (rows-1)/2) * py, d]];

// Rack of identical bores. pitch_x / pitch_y default to an even spread across
// the block footprint; pass them explicitly to pack tighter and leave a margin.
module syringe_rack(nx, ny, cols, rows, syringe_d, capture_h = 35,
                    floor = 1.4, clr = SYR_CLR, min_wall = SYR_MIN_WALL,
                    pitch_x = 0, pitch_y = 0) {
    px   = pitch_x > 0 ? pitch_x : nx * GF / cols;
    py   = pitch_y > 0 ? pitch_y : ny * GF / rows;
    bore = syringe_d + clr;

    assert(px >= bore + 2 * min_wall,
           "syringe_rack: too many columns — bores would merge or breach the outer wall");
    assert(py >= bore + 2 * min_wall,
           "syringe_rack: too many rows — bores would merge or breach the outer wall");

    collar_cup_multi(nx, ny, bore_grid(cols, rows, syringe_d, px, py),
                     capture_h, floor, clr);
}
// file: syringe_holders_common.scad
// syringe_holders_common — shared syringe/flux holder geometry.
// All working syringes are 10 cc (⌀~10.8) except the 30 cc flux (⌀25.5).
include <../lib/syringe.scad>
D_LARGE = 25.5;   // 30 cc flux
D_SMALL = 10.8;   // 10 cc flux / paste / UV-mask
CAPTURE = 40;     // bore depth; syringes stand proud above
// Flux: 2 large (back row) + 4 small (front 2×2), generous webs in a 2×2.
FLUX_BORES = [
    [-20,  20, D_LARGE], [20,  20, D_LARGE],
    [-20,  -6, D_SMALL], [20,  -6, D_SMALL],
    [-20, -26, D_SMALL], [20, -26, D_SMALL],
];
// main file
// bin_paste — 1×1 rack for 4× 10 cc solder-paste syringes (2×2 bores, generous).
// NOTE: paste ages and prefers cool/capped storage — see bench-master-list. This
// holder is for the working set; keep bulk paste cool, not on the open bench.
include <syringe_holders_common.scad>
syringe_rack(1, 1, 2, 2, D_SMALL, CAPTURE);
